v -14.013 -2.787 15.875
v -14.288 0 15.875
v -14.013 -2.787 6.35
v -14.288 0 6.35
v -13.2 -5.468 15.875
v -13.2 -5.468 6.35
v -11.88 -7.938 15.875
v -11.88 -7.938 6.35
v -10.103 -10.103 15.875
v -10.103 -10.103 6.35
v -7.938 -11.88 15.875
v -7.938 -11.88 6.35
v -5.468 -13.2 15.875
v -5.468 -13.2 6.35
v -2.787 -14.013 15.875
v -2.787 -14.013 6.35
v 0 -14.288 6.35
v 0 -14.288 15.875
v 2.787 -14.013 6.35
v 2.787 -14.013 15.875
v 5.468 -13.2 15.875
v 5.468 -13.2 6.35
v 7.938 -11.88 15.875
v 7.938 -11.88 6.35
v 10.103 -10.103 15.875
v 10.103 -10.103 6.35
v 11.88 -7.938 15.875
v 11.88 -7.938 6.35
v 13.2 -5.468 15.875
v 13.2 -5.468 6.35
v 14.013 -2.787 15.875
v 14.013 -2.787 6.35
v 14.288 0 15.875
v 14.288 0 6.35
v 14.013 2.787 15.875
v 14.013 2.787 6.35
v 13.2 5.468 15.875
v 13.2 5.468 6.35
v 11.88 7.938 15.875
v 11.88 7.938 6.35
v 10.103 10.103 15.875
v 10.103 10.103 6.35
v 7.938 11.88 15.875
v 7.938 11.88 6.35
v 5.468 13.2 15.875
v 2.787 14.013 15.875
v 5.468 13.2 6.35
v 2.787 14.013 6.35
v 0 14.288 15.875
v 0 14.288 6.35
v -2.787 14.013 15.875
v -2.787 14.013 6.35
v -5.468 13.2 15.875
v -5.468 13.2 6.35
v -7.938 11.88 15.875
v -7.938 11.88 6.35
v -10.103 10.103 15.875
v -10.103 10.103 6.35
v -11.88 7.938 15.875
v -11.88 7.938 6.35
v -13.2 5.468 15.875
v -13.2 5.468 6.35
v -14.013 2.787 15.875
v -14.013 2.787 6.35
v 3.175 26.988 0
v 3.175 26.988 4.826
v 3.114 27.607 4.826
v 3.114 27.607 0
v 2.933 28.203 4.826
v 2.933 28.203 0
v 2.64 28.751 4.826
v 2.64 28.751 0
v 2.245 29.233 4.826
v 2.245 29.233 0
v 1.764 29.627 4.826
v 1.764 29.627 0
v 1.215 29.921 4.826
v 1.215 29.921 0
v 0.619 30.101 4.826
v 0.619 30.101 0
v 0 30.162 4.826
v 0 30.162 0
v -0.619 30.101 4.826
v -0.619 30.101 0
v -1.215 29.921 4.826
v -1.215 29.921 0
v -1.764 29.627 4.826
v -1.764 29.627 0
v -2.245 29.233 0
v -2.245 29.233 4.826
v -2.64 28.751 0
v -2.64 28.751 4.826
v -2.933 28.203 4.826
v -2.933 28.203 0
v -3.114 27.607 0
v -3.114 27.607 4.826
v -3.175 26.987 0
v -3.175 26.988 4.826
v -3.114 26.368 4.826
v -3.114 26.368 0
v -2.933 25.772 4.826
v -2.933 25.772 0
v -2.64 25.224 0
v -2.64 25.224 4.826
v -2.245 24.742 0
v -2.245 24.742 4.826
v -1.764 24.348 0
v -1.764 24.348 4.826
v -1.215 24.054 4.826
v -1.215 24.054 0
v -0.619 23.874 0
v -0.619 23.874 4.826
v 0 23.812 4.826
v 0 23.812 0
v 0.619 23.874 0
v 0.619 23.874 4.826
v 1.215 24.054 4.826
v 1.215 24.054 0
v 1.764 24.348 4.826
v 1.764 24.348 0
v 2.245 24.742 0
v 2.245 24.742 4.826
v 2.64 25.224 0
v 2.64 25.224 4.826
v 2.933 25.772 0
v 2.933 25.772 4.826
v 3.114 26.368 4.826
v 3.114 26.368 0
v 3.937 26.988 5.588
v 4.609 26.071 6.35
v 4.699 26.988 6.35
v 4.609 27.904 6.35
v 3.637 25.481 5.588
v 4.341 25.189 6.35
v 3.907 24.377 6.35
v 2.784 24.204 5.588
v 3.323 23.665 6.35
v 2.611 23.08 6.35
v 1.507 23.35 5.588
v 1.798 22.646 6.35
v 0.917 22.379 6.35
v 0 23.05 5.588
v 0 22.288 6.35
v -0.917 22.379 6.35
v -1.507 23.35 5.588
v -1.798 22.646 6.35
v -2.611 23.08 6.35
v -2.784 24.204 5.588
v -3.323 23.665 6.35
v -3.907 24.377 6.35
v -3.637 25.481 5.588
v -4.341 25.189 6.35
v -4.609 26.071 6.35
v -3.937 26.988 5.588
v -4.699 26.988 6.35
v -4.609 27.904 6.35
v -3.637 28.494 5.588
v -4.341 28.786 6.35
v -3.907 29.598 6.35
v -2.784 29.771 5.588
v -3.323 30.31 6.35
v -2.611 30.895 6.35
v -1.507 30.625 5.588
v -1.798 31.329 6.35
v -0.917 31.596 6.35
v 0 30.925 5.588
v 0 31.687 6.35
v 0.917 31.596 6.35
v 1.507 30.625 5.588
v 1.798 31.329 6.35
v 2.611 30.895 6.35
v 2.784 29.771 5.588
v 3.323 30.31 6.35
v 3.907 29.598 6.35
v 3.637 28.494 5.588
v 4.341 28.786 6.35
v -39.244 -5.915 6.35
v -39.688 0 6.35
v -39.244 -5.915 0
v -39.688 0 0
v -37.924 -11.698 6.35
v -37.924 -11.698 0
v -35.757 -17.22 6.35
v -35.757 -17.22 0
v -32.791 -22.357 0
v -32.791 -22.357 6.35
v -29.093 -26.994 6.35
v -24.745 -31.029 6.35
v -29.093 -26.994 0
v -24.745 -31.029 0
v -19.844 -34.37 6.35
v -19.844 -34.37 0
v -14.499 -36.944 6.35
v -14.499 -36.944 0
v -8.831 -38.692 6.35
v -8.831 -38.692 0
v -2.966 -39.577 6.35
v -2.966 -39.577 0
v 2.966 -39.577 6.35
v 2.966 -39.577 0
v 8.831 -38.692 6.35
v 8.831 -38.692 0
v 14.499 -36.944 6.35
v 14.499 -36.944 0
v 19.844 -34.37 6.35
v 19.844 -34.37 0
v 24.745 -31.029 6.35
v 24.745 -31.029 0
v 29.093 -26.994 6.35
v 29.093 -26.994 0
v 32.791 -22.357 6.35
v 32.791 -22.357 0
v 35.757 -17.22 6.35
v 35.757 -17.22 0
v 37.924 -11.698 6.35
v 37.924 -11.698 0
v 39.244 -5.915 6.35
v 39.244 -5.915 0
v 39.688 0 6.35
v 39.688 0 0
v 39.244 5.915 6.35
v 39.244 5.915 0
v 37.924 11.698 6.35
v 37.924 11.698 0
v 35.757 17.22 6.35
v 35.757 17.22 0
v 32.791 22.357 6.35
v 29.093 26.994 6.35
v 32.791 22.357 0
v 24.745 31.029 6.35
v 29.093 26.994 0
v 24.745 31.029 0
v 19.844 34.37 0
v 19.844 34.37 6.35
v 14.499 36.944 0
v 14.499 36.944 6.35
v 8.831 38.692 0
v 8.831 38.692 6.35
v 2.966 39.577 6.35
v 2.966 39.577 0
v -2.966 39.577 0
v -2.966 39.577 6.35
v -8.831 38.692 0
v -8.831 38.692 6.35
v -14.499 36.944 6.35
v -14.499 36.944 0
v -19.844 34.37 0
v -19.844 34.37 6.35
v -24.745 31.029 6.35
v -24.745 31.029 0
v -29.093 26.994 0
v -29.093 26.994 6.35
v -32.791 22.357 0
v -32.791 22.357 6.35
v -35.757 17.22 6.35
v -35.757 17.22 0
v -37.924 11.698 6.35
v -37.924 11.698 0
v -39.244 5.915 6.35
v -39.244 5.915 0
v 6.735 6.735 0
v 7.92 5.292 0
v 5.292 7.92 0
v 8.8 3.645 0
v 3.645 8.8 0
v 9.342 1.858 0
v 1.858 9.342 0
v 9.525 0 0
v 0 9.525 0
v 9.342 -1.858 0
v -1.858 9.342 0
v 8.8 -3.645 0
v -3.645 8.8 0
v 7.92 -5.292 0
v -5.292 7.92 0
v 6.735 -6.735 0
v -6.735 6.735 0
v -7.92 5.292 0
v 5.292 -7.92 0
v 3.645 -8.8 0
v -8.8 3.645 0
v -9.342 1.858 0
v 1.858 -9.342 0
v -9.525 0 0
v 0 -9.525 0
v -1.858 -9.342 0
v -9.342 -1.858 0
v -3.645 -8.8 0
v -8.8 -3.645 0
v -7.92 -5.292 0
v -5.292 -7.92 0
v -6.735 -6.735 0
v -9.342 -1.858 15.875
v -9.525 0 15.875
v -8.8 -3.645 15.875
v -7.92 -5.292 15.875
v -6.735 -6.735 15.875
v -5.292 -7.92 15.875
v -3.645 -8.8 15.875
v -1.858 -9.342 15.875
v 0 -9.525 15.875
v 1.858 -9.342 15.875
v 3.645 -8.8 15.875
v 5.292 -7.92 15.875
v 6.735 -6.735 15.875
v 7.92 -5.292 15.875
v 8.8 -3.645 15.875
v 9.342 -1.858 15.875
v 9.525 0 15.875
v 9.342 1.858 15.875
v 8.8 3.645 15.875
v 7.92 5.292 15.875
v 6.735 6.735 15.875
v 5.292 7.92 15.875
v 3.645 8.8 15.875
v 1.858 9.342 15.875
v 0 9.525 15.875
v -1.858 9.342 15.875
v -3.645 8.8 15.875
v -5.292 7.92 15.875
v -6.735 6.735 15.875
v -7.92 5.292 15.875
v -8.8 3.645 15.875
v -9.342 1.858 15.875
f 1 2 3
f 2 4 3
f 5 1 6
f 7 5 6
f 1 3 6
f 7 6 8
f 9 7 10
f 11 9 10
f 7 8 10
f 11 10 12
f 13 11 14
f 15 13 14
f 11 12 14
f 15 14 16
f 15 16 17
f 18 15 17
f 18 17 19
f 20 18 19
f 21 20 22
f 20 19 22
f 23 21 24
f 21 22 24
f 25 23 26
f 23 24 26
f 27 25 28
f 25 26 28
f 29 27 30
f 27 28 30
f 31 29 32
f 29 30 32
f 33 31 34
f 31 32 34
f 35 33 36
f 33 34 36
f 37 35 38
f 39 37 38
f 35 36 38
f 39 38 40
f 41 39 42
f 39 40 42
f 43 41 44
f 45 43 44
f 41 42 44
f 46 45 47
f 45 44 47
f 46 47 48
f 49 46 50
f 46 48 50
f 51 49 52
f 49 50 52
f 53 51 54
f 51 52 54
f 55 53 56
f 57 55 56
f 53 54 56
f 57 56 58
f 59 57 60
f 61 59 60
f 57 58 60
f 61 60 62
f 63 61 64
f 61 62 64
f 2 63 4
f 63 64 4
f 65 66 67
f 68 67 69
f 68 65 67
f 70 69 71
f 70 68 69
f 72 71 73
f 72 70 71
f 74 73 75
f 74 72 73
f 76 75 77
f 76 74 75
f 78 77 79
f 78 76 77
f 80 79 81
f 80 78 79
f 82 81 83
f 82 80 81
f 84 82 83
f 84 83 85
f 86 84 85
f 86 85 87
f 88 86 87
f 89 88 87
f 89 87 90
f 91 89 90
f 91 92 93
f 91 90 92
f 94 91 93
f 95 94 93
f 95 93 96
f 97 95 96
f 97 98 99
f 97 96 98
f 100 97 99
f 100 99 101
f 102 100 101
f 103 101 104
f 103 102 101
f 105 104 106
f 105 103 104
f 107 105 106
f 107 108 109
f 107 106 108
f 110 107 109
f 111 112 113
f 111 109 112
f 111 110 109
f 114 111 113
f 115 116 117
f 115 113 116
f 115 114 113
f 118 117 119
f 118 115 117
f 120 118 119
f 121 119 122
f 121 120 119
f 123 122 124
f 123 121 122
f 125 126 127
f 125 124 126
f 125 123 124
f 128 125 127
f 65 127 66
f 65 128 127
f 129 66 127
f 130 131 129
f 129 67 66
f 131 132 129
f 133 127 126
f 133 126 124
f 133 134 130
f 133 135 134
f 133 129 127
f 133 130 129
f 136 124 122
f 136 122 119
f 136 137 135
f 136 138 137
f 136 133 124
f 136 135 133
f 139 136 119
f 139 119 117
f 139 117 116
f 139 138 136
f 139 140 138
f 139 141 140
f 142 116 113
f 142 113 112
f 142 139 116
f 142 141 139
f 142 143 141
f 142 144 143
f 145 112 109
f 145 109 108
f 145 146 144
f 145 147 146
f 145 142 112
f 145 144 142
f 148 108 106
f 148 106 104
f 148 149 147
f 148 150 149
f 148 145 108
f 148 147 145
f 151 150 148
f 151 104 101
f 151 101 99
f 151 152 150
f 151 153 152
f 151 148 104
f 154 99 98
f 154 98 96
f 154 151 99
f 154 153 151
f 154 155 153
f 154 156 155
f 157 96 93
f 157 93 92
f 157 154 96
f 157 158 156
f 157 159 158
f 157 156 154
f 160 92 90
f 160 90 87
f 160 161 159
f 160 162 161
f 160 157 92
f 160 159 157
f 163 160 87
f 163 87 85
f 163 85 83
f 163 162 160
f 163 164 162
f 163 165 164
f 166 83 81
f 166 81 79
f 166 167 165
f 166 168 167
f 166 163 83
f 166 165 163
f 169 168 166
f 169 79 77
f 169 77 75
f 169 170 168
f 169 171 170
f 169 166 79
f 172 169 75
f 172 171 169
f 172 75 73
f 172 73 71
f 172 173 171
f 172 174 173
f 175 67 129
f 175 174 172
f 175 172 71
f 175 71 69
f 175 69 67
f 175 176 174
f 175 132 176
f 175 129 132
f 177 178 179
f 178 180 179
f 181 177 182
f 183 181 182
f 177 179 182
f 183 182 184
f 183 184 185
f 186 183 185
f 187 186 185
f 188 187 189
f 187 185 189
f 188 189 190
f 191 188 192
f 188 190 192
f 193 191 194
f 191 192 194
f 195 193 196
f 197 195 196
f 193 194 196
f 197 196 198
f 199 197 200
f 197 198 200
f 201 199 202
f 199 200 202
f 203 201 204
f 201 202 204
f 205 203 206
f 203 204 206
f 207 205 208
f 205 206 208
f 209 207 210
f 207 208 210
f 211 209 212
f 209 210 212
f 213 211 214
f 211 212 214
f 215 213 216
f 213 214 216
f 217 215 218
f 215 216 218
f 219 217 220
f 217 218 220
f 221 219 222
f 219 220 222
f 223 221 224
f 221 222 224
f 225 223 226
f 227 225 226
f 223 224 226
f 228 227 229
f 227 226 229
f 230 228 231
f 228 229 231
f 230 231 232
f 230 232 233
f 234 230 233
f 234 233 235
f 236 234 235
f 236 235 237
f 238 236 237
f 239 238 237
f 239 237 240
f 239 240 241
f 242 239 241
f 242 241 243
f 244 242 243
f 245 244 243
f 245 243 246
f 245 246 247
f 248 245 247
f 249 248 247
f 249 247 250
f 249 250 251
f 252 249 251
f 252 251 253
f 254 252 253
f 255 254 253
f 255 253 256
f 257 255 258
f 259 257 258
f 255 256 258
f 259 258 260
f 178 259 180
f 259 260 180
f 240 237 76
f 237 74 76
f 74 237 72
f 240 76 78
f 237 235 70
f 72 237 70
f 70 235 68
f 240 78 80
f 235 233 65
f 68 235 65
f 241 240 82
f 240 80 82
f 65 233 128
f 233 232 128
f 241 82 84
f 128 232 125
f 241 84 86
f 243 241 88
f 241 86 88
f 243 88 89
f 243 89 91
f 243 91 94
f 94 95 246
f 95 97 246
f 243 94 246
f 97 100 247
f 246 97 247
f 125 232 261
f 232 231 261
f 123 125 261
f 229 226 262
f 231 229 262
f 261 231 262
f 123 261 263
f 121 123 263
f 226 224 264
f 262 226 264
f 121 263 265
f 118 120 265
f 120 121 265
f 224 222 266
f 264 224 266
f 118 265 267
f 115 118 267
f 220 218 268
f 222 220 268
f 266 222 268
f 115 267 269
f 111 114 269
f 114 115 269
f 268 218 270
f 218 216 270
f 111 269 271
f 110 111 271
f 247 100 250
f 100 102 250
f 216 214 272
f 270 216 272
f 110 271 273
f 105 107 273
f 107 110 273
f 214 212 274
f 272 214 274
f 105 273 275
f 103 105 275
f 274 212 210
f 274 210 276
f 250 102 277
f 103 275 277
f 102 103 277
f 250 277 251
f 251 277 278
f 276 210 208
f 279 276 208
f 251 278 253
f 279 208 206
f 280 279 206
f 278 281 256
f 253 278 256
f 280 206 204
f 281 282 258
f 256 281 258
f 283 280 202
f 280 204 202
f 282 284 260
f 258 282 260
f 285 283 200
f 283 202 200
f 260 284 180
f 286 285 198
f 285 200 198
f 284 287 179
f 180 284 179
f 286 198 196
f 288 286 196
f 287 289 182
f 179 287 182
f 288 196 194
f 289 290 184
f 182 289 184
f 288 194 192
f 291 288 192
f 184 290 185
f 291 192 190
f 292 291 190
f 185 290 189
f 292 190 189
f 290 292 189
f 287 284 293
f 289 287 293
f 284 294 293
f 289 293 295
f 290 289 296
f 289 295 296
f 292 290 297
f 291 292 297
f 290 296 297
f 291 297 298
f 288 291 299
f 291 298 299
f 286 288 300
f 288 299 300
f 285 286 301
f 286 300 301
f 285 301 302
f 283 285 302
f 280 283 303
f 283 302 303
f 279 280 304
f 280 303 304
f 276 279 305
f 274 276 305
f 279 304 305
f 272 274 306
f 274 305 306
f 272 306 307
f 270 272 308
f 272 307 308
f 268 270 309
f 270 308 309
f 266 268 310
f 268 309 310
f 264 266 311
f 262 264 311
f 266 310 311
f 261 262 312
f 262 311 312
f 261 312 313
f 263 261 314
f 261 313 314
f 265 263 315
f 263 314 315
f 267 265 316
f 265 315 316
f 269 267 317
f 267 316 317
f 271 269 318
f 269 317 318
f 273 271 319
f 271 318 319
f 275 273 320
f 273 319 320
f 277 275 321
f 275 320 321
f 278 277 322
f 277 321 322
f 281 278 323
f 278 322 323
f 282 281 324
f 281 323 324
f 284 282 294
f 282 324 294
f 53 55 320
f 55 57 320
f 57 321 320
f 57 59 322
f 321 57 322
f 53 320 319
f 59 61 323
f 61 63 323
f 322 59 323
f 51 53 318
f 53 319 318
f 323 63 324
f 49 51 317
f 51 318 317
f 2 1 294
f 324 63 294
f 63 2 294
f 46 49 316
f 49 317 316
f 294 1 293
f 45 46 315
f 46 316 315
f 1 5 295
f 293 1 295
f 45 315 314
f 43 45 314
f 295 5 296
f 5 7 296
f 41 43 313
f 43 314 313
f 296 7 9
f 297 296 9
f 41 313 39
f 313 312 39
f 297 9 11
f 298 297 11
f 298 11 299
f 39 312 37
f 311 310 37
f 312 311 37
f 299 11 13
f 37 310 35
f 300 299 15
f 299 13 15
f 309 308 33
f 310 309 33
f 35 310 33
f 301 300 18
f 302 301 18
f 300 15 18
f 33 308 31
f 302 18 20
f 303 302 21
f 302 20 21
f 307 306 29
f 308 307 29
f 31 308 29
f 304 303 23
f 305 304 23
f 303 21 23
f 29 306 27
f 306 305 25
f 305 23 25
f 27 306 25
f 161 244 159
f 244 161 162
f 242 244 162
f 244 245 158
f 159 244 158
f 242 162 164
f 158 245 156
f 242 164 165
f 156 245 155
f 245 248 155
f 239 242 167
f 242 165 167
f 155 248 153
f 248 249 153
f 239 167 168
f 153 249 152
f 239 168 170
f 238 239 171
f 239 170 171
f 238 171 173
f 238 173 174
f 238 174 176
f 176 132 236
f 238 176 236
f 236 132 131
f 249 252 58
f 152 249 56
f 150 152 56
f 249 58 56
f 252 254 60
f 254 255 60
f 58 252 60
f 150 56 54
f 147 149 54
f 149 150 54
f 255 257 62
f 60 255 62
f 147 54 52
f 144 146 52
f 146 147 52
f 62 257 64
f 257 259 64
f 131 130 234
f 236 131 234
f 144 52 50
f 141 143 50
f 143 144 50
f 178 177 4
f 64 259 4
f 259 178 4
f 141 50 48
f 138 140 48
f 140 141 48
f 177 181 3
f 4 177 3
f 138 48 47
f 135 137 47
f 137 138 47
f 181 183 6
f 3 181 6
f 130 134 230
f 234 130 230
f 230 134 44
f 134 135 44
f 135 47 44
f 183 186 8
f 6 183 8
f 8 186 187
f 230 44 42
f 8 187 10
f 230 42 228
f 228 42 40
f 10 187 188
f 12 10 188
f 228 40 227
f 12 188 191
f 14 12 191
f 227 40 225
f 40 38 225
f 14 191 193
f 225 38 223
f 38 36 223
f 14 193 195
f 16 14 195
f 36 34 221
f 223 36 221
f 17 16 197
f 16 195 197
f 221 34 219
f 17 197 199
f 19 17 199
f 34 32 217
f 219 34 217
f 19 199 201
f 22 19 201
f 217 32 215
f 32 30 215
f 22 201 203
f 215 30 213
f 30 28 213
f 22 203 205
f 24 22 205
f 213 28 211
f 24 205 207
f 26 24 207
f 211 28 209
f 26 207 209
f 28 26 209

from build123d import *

# Parameters (mm, degrees)
F2_R     = 3.175
F3_DEPTH = 15.876
F4_SIZE  = 1.524


with BuildPart() as f1:
    # F0 (on Front) → F1 (revolve)
    with BuildSketch(Plane.XZ):
        Polygon((-39.6875, 0), (-9.525, 0), (-9.525, 15.875), (-14.2875, 15.875), (-14.2875, 6.35), (-39.6875, 6.35), align=None)
    revolve(axis=Axis((0, 0, 22.6741275327), (0, 0, 1)))

    # F2 (on Top) → F3 (cut, through all)
    with BuildSketch(Plane.XY):
        with Locations((0, 26.9875)):
            Circle(F2_R)
    extrude(amount=F3_DEPTH, mode=Mode.SUBTRACT)

    # F4
    f4_edges = [f1.edges().sort_by_distance(p)[0] for p in [
        (-3.175, 26.9875, 6.35),
    ]]
    chamfer(f4_edges, length=F4_SIZE)


solid = f1.part
